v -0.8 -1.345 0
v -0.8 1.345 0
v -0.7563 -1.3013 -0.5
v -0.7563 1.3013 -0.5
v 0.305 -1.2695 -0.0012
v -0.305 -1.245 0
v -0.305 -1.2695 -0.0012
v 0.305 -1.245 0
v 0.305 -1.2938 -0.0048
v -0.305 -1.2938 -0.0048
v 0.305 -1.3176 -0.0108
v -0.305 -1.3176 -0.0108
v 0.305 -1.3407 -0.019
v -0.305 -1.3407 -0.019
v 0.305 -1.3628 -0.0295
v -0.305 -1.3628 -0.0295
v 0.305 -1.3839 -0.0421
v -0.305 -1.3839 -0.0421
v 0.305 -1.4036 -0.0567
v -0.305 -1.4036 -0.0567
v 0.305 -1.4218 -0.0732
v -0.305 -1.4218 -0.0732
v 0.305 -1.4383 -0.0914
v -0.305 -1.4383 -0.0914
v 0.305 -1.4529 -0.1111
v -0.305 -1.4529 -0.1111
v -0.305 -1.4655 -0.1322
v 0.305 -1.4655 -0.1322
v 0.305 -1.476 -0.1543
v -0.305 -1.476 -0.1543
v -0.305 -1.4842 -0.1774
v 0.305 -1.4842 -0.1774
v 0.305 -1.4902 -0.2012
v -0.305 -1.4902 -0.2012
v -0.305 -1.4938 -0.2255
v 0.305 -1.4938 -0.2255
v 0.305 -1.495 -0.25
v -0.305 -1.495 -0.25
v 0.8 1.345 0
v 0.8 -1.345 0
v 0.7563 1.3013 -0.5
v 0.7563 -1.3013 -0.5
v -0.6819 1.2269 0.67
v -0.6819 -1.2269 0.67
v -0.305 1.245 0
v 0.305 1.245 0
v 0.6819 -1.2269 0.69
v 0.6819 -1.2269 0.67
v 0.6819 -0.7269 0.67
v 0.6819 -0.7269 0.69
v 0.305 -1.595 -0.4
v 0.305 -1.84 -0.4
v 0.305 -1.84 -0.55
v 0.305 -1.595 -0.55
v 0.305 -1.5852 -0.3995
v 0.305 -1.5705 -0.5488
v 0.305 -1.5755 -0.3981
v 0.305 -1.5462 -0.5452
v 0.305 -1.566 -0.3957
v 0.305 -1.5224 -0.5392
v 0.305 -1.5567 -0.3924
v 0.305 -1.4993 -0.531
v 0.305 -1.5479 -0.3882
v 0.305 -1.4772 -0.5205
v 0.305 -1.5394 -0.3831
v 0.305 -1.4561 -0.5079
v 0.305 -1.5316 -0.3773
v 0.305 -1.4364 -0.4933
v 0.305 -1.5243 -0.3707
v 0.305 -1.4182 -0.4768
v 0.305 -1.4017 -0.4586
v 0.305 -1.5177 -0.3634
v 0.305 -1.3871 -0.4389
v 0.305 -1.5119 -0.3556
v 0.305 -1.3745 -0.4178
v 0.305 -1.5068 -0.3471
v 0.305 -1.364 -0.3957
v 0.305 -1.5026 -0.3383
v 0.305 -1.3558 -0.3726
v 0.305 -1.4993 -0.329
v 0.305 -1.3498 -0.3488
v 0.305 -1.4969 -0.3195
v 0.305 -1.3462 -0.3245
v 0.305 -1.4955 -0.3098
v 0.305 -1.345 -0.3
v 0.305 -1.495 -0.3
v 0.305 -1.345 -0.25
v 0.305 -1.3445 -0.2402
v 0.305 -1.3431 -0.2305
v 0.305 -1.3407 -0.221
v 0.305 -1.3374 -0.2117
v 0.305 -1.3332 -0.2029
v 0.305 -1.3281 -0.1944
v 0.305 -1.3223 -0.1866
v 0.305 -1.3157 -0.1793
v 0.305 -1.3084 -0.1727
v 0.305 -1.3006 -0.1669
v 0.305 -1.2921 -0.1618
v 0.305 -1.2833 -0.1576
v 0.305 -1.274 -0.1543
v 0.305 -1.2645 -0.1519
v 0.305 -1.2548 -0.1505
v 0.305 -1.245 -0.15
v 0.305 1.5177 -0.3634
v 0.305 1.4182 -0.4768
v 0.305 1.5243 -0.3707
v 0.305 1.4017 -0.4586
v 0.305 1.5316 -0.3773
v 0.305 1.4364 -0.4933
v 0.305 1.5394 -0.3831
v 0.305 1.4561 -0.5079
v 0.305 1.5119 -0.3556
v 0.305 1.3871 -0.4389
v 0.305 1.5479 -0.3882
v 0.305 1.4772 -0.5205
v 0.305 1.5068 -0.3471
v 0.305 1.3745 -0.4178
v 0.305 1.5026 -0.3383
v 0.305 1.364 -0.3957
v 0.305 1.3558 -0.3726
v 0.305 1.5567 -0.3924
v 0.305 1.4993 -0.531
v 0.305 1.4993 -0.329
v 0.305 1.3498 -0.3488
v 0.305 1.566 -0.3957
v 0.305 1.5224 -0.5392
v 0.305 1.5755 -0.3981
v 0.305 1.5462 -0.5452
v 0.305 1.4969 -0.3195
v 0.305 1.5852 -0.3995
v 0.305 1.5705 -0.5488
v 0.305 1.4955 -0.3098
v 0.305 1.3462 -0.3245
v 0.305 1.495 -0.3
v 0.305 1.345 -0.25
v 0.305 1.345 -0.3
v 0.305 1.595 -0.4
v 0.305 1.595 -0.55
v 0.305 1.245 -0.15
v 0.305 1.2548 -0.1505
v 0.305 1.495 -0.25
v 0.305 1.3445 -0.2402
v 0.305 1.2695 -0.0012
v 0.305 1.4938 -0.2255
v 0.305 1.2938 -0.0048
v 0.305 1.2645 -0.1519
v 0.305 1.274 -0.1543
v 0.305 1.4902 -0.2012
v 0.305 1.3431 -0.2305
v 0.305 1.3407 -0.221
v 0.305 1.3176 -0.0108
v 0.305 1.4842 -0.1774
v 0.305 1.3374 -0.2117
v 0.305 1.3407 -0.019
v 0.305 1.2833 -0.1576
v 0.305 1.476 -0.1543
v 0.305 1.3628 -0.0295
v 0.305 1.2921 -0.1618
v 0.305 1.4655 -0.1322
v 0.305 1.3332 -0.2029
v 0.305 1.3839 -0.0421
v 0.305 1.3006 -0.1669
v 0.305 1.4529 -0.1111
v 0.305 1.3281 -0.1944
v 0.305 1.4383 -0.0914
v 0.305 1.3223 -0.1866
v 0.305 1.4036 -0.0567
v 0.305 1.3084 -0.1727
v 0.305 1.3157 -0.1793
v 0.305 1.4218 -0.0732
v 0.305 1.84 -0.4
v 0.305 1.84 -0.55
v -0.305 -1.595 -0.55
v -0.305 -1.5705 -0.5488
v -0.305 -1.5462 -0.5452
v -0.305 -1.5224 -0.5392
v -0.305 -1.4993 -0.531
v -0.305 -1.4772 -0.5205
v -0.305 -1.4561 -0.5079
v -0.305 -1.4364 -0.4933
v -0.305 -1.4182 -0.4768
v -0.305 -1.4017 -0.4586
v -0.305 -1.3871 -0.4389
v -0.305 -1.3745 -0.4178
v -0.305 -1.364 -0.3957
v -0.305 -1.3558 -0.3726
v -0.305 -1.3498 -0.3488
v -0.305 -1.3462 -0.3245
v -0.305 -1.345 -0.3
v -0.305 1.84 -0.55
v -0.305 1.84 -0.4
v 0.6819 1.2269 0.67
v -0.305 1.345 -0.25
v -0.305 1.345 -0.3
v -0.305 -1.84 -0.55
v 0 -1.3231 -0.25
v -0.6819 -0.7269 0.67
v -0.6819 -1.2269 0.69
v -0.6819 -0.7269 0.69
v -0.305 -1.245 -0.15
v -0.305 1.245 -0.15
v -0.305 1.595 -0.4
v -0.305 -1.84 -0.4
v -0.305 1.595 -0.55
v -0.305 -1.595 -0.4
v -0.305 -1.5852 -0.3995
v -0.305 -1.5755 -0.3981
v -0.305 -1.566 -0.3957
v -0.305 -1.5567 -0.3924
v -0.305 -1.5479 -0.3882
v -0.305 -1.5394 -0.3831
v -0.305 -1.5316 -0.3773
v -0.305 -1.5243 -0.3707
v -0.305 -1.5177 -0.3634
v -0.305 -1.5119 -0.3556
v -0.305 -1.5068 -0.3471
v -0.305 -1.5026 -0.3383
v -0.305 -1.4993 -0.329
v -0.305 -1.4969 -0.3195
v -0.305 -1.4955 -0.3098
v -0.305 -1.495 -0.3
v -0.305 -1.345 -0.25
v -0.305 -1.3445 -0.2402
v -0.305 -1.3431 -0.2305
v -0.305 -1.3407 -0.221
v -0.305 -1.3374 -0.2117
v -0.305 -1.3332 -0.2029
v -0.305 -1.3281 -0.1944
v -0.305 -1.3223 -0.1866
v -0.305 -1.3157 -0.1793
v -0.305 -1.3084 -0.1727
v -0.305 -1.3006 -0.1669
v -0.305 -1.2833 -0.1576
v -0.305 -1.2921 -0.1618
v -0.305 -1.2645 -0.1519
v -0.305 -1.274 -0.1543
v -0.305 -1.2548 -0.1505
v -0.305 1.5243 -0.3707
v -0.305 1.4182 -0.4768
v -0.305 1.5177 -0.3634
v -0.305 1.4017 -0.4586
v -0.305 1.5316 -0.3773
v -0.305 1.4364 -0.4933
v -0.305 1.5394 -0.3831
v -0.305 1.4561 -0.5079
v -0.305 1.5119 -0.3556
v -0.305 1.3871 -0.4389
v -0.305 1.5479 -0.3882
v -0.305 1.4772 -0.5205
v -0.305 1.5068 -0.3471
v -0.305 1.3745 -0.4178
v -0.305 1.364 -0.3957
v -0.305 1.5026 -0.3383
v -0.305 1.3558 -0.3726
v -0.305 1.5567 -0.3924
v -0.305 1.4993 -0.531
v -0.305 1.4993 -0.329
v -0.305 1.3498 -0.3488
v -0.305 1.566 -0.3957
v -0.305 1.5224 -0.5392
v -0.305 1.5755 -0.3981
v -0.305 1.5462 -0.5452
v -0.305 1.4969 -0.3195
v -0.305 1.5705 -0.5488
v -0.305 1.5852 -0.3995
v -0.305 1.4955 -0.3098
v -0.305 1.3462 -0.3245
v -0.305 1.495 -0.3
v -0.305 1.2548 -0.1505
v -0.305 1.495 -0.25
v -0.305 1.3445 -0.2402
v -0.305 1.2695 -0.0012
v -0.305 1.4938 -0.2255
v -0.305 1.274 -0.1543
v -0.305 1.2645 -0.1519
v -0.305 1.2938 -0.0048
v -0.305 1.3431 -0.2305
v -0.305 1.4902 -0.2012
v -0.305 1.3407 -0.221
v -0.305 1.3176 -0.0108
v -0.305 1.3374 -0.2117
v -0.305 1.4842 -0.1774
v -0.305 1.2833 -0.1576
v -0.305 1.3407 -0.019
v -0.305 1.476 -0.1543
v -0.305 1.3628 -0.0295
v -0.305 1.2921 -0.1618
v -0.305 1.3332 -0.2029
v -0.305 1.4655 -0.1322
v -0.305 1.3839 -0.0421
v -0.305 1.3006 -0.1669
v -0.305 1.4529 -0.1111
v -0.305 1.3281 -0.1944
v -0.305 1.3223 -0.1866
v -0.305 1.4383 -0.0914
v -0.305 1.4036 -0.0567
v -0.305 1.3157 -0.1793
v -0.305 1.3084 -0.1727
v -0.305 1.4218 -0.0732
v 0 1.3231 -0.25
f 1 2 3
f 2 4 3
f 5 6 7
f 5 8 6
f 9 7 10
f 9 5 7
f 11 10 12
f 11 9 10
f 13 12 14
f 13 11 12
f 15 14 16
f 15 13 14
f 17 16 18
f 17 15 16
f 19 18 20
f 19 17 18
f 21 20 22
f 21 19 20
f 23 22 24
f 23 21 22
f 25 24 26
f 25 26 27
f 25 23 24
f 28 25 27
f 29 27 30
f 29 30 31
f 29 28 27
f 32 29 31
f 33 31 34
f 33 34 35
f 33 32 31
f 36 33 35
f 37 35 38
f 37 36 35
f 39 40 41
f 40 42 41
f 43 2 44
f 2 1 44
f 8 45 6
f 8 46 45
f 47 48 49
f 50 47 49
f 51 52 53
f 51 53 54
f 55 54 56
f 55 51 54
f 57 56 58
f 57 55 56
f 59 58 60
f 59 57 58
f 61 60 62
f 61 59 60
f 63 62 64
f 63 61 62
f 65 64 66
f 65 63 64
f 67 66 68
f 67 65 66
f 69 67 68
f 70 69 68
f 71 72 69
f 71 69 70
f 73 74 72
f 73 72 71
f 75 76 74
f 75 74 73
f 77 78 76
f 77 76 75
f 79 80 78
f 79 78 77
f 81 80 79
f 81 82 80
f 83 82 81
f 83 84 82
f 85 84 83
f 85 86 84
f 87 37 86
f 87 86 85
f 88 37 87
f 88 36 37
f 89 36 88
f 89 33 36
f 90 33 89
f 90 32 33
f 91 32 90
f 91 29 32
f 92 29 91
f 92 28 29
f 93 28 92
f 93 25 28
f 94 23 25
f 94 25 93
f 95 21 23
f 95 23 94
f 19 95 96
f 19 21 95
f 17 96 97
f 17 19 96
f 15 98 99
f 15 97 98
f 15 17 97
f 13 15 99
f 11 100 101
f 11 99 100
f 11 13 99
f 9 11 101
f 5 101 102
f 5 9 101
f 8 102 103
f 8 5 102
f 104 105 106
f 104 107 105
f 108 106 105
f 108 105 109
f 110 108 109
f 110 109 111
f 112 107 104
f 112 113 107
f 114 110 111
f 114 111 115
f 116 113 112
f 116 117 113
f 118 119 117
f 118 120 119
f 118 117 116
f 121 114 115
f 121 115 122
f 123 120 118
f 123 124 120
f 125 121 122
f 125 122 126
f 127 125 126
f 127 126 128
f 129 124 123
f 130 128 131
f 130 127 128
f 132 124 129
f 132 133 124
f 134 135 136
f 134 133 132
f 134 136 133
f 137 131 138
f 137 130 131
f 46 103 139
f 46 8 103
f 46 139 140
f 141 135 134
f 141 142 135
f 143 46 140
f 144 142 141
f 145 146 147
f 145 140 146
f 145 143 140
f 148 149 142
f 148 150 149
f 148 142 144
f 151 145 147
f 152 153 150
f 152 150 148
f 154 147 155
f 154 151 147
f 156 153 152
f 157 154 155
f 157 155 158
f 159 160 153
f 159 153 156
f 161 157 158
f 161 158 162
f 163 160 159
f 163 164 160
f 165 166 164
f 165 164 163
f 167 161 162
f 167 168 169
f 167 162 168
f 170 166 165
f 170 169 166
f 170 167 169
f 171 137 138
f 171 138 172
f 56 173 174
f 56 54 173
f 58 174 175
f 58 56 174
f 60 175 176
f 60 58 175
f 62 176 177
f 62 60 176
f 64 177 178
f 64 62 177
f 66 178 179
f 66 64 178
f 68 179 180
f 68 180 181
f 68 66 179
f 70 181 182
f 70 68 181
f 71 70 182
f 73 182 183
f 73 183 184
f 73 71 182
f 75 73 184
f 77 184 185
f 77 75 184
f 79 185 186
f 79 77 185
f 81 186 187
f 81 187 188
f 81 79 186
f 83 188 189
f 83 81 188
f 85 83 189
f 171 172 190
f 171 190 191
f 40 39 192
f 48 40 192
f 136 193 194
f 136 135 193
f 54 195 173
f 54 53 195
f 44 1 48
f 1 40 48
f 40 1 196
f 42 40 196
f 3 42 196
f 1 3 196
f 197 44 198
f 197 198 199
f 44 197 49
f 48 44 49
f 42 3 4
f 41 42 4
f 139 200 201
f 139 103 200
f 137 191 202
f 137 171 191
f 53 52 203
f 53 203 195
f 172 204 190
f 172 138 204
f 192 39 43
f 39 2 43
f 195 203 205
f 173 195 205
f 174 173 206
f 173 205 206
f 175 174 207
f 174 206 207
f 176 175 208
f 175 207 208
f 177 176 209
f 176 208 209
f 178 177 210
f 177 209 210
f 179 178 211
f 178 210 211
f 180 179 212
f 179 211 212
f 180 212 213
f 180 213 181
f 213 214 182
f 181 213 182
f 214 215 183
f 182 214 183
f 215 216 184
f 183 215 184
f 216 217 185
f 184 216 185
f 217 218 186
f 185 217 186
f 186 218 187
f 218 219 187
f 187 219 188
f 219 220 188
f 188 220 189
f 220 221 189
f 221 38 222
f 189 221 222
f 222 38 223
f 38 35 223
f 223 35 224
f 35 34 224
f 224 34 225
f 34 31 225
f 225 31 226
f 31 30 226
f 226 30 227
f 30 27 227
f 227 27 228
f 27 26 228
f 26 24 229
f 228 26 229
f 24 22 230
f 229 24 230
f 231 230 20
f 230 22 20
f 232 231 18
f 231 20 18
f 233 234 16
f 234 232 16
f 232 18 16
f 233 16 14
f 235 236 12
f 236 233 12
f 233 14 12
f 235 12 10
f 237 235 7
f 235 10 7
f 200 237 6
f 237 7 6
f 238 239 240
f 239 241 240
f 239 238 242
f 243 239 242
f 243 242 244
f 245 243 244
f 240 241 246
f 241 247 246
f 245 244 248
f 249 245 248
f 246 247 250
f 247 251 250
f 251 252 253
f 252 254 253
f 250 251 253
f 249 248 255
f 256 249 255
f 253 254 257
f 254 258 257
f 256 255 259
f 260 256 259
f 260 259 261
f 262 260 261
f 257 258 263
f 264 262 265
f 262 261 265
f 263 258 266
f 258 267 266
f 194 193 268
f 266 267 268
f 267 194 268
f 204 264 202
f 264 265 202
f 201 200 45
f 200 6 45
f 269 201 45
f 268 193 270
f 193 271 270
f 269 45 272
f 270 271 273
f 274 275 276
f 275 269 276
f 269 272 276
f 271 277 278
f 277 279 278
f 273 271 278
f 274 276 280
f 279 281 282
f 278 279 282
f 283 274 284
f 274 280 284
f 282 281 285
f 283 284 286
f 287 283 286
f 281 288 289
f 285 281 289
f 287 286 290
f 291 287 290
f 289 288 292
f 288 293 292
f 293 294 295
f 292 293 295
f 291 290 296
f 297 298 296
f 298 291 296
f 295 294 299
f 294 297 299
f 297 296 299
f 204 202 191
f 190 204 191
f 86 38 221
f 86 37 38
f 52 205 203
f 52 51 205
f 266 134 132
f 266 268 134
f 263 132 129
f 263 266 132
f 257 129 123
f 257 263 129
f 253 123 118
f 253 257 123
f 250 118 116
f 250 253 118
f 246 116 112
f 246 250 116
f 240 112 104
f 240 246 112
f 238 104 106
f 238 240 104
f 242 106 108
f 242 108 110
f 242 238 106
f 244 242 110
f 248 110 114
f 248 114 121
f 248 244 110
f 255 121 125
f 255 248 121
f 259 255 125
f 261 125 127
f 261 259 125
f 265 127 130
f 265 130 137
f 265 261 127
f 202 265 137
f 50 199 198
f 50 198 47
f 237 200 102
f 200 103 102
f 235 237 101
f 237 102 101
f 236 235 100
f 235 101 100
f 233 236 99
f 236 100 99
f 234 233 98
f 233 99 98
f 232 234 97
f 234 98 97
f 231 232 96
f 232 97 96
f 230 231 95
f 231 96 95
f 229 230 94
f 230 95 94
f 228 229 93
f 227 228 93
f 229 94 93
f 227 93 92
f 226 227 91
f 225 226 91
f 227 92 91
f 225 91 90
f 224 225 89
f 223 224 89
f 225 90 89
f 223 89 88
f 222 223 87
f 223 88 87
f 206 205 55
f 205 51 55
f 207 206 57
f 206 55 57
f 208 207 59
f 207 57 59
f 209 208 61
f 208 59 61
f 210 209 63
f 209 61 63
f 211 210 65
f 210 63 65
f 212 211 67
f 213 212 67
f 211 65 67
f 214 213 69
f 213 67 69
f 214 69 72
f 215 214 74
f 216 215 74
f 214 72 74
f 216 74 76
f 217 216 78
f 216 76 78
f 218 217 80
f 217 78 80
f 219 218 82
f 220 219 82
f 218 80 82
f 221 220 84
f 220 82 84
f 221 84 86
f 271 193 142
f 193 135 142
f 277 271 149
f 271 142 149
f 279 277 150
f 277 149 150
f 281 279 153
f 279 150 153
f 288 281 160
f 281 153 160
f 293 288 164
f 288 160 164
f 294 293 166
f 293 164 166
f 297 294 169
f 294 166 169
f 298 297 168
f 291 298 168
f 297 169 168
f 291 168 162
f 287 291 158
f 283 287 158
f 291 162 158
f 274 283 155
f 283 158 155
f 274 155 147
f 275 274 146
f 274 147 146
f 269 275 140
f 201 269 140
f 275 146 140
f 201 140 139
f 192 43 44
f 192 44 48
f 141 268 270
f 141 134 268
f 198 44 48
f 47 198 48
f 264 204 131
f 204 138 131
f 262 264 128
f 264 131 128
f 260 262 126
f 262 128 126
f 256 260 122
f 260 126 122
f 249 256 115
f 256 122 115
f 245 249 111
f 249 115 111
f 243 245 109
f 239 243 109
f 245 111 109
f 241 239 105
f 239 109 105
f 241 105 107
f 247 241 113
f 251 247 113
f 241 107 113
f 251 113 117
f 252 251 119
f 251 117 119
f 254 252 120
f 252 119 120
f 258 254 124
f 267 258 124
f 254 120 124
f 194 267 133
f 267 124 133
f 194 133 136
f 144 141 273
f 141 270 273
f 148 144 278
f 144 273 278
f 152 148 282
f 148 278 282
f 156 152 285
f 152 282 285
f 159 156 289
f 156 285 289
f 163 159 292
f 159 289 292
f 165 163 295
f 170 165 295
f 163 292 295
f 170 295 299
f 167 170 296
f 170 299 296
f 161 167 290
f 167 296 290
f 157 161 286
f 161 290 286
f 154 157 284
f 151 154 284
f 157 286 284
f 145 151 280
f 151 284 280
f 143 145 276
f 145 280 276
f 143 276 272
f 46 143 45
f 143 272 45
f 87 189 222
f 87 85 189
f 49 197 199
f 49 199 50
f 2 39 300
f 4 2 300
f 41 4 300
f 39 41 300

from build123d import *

# Parameters (mm, degrees)
F0_W     = 1.6
F0_H     = 2.69
F1_DEPTH = 0.5
F1_TAPER = 5
F2_DEPTH = 0.67
F2_TAPER = 10
F4_DEPTH = 0.305
F5_R     = 0.1
F6_R     = 0.25
F7_W     = 1.3637218459
F7_H     = 0.5
F8_DEPTH = 0.02


with BuildPart() as f1:
    # F0 (on Top) → F1 (new body)
    with BuildSketch(Plane.XY):
        Rectangle(F0_W, F0_H)
    extrude(amount=-F1_DEPTH, taper=F1_TAPER)

    # F0 (on Top) → F2 (join)
    with BuildSketch(Plane.XY):
        Rectangle(F0_W, F0_H)
    extrude(amount=F2_DEPTH, taper=F2_TAPER)


with BuildPart() as f4:
    # F3 (on Right) → F4 (new body, symmetric)
    with BuildSketch(Plane.YZ):
        Polygon((1.495, 0), (0, 0), (-1.495, 0), (-1.495, -0.4), (-1.84, -0.4), (-1.84, -0.55), (-1.345, -0.55), (-1.345, -0.15), (0, -0.15), (1.345, -0.15), (1.345, -0.55), (1.84, -0.55), (1.84, -0.4), (1.495, -0.4), align=None)
    extrude(amount=F4_DEPTH, both=True)

    # F5
    f5_edges = [f4.edges().sort_by_distance(p)[0] for p in [
        (0, 1.495, -0.4),
        (0, -1.495, -0.4),
        (0, 1.345, -0.15),
        (0, -1.345, -0.15),
    ]]
    fillet(f5_edges, radius=F5_R)

    # F6
    f6_edges = [f4.edges().sort_by_distance(p)[0] for p in [
        (0, -1.495, 0),
        (0, -1.345, -0.55),
        (0, 1.345, -0.55),
        (0, 1.495, 0),
    ]]
    fillet(f6_edges, radius=F6_R)


with BuildPart() as f8:
    # F7 (on face) → F8 (new body)
    with BuildSketch(Plane.XY.offset(0.67)):
        with Locations((0, -0.9768609229)):
            Rectangle(F7_W, F7_H)
    extrude(amount=F8_DEPTH)


solid = Compound([f1.part, f4.part, f8.part])
